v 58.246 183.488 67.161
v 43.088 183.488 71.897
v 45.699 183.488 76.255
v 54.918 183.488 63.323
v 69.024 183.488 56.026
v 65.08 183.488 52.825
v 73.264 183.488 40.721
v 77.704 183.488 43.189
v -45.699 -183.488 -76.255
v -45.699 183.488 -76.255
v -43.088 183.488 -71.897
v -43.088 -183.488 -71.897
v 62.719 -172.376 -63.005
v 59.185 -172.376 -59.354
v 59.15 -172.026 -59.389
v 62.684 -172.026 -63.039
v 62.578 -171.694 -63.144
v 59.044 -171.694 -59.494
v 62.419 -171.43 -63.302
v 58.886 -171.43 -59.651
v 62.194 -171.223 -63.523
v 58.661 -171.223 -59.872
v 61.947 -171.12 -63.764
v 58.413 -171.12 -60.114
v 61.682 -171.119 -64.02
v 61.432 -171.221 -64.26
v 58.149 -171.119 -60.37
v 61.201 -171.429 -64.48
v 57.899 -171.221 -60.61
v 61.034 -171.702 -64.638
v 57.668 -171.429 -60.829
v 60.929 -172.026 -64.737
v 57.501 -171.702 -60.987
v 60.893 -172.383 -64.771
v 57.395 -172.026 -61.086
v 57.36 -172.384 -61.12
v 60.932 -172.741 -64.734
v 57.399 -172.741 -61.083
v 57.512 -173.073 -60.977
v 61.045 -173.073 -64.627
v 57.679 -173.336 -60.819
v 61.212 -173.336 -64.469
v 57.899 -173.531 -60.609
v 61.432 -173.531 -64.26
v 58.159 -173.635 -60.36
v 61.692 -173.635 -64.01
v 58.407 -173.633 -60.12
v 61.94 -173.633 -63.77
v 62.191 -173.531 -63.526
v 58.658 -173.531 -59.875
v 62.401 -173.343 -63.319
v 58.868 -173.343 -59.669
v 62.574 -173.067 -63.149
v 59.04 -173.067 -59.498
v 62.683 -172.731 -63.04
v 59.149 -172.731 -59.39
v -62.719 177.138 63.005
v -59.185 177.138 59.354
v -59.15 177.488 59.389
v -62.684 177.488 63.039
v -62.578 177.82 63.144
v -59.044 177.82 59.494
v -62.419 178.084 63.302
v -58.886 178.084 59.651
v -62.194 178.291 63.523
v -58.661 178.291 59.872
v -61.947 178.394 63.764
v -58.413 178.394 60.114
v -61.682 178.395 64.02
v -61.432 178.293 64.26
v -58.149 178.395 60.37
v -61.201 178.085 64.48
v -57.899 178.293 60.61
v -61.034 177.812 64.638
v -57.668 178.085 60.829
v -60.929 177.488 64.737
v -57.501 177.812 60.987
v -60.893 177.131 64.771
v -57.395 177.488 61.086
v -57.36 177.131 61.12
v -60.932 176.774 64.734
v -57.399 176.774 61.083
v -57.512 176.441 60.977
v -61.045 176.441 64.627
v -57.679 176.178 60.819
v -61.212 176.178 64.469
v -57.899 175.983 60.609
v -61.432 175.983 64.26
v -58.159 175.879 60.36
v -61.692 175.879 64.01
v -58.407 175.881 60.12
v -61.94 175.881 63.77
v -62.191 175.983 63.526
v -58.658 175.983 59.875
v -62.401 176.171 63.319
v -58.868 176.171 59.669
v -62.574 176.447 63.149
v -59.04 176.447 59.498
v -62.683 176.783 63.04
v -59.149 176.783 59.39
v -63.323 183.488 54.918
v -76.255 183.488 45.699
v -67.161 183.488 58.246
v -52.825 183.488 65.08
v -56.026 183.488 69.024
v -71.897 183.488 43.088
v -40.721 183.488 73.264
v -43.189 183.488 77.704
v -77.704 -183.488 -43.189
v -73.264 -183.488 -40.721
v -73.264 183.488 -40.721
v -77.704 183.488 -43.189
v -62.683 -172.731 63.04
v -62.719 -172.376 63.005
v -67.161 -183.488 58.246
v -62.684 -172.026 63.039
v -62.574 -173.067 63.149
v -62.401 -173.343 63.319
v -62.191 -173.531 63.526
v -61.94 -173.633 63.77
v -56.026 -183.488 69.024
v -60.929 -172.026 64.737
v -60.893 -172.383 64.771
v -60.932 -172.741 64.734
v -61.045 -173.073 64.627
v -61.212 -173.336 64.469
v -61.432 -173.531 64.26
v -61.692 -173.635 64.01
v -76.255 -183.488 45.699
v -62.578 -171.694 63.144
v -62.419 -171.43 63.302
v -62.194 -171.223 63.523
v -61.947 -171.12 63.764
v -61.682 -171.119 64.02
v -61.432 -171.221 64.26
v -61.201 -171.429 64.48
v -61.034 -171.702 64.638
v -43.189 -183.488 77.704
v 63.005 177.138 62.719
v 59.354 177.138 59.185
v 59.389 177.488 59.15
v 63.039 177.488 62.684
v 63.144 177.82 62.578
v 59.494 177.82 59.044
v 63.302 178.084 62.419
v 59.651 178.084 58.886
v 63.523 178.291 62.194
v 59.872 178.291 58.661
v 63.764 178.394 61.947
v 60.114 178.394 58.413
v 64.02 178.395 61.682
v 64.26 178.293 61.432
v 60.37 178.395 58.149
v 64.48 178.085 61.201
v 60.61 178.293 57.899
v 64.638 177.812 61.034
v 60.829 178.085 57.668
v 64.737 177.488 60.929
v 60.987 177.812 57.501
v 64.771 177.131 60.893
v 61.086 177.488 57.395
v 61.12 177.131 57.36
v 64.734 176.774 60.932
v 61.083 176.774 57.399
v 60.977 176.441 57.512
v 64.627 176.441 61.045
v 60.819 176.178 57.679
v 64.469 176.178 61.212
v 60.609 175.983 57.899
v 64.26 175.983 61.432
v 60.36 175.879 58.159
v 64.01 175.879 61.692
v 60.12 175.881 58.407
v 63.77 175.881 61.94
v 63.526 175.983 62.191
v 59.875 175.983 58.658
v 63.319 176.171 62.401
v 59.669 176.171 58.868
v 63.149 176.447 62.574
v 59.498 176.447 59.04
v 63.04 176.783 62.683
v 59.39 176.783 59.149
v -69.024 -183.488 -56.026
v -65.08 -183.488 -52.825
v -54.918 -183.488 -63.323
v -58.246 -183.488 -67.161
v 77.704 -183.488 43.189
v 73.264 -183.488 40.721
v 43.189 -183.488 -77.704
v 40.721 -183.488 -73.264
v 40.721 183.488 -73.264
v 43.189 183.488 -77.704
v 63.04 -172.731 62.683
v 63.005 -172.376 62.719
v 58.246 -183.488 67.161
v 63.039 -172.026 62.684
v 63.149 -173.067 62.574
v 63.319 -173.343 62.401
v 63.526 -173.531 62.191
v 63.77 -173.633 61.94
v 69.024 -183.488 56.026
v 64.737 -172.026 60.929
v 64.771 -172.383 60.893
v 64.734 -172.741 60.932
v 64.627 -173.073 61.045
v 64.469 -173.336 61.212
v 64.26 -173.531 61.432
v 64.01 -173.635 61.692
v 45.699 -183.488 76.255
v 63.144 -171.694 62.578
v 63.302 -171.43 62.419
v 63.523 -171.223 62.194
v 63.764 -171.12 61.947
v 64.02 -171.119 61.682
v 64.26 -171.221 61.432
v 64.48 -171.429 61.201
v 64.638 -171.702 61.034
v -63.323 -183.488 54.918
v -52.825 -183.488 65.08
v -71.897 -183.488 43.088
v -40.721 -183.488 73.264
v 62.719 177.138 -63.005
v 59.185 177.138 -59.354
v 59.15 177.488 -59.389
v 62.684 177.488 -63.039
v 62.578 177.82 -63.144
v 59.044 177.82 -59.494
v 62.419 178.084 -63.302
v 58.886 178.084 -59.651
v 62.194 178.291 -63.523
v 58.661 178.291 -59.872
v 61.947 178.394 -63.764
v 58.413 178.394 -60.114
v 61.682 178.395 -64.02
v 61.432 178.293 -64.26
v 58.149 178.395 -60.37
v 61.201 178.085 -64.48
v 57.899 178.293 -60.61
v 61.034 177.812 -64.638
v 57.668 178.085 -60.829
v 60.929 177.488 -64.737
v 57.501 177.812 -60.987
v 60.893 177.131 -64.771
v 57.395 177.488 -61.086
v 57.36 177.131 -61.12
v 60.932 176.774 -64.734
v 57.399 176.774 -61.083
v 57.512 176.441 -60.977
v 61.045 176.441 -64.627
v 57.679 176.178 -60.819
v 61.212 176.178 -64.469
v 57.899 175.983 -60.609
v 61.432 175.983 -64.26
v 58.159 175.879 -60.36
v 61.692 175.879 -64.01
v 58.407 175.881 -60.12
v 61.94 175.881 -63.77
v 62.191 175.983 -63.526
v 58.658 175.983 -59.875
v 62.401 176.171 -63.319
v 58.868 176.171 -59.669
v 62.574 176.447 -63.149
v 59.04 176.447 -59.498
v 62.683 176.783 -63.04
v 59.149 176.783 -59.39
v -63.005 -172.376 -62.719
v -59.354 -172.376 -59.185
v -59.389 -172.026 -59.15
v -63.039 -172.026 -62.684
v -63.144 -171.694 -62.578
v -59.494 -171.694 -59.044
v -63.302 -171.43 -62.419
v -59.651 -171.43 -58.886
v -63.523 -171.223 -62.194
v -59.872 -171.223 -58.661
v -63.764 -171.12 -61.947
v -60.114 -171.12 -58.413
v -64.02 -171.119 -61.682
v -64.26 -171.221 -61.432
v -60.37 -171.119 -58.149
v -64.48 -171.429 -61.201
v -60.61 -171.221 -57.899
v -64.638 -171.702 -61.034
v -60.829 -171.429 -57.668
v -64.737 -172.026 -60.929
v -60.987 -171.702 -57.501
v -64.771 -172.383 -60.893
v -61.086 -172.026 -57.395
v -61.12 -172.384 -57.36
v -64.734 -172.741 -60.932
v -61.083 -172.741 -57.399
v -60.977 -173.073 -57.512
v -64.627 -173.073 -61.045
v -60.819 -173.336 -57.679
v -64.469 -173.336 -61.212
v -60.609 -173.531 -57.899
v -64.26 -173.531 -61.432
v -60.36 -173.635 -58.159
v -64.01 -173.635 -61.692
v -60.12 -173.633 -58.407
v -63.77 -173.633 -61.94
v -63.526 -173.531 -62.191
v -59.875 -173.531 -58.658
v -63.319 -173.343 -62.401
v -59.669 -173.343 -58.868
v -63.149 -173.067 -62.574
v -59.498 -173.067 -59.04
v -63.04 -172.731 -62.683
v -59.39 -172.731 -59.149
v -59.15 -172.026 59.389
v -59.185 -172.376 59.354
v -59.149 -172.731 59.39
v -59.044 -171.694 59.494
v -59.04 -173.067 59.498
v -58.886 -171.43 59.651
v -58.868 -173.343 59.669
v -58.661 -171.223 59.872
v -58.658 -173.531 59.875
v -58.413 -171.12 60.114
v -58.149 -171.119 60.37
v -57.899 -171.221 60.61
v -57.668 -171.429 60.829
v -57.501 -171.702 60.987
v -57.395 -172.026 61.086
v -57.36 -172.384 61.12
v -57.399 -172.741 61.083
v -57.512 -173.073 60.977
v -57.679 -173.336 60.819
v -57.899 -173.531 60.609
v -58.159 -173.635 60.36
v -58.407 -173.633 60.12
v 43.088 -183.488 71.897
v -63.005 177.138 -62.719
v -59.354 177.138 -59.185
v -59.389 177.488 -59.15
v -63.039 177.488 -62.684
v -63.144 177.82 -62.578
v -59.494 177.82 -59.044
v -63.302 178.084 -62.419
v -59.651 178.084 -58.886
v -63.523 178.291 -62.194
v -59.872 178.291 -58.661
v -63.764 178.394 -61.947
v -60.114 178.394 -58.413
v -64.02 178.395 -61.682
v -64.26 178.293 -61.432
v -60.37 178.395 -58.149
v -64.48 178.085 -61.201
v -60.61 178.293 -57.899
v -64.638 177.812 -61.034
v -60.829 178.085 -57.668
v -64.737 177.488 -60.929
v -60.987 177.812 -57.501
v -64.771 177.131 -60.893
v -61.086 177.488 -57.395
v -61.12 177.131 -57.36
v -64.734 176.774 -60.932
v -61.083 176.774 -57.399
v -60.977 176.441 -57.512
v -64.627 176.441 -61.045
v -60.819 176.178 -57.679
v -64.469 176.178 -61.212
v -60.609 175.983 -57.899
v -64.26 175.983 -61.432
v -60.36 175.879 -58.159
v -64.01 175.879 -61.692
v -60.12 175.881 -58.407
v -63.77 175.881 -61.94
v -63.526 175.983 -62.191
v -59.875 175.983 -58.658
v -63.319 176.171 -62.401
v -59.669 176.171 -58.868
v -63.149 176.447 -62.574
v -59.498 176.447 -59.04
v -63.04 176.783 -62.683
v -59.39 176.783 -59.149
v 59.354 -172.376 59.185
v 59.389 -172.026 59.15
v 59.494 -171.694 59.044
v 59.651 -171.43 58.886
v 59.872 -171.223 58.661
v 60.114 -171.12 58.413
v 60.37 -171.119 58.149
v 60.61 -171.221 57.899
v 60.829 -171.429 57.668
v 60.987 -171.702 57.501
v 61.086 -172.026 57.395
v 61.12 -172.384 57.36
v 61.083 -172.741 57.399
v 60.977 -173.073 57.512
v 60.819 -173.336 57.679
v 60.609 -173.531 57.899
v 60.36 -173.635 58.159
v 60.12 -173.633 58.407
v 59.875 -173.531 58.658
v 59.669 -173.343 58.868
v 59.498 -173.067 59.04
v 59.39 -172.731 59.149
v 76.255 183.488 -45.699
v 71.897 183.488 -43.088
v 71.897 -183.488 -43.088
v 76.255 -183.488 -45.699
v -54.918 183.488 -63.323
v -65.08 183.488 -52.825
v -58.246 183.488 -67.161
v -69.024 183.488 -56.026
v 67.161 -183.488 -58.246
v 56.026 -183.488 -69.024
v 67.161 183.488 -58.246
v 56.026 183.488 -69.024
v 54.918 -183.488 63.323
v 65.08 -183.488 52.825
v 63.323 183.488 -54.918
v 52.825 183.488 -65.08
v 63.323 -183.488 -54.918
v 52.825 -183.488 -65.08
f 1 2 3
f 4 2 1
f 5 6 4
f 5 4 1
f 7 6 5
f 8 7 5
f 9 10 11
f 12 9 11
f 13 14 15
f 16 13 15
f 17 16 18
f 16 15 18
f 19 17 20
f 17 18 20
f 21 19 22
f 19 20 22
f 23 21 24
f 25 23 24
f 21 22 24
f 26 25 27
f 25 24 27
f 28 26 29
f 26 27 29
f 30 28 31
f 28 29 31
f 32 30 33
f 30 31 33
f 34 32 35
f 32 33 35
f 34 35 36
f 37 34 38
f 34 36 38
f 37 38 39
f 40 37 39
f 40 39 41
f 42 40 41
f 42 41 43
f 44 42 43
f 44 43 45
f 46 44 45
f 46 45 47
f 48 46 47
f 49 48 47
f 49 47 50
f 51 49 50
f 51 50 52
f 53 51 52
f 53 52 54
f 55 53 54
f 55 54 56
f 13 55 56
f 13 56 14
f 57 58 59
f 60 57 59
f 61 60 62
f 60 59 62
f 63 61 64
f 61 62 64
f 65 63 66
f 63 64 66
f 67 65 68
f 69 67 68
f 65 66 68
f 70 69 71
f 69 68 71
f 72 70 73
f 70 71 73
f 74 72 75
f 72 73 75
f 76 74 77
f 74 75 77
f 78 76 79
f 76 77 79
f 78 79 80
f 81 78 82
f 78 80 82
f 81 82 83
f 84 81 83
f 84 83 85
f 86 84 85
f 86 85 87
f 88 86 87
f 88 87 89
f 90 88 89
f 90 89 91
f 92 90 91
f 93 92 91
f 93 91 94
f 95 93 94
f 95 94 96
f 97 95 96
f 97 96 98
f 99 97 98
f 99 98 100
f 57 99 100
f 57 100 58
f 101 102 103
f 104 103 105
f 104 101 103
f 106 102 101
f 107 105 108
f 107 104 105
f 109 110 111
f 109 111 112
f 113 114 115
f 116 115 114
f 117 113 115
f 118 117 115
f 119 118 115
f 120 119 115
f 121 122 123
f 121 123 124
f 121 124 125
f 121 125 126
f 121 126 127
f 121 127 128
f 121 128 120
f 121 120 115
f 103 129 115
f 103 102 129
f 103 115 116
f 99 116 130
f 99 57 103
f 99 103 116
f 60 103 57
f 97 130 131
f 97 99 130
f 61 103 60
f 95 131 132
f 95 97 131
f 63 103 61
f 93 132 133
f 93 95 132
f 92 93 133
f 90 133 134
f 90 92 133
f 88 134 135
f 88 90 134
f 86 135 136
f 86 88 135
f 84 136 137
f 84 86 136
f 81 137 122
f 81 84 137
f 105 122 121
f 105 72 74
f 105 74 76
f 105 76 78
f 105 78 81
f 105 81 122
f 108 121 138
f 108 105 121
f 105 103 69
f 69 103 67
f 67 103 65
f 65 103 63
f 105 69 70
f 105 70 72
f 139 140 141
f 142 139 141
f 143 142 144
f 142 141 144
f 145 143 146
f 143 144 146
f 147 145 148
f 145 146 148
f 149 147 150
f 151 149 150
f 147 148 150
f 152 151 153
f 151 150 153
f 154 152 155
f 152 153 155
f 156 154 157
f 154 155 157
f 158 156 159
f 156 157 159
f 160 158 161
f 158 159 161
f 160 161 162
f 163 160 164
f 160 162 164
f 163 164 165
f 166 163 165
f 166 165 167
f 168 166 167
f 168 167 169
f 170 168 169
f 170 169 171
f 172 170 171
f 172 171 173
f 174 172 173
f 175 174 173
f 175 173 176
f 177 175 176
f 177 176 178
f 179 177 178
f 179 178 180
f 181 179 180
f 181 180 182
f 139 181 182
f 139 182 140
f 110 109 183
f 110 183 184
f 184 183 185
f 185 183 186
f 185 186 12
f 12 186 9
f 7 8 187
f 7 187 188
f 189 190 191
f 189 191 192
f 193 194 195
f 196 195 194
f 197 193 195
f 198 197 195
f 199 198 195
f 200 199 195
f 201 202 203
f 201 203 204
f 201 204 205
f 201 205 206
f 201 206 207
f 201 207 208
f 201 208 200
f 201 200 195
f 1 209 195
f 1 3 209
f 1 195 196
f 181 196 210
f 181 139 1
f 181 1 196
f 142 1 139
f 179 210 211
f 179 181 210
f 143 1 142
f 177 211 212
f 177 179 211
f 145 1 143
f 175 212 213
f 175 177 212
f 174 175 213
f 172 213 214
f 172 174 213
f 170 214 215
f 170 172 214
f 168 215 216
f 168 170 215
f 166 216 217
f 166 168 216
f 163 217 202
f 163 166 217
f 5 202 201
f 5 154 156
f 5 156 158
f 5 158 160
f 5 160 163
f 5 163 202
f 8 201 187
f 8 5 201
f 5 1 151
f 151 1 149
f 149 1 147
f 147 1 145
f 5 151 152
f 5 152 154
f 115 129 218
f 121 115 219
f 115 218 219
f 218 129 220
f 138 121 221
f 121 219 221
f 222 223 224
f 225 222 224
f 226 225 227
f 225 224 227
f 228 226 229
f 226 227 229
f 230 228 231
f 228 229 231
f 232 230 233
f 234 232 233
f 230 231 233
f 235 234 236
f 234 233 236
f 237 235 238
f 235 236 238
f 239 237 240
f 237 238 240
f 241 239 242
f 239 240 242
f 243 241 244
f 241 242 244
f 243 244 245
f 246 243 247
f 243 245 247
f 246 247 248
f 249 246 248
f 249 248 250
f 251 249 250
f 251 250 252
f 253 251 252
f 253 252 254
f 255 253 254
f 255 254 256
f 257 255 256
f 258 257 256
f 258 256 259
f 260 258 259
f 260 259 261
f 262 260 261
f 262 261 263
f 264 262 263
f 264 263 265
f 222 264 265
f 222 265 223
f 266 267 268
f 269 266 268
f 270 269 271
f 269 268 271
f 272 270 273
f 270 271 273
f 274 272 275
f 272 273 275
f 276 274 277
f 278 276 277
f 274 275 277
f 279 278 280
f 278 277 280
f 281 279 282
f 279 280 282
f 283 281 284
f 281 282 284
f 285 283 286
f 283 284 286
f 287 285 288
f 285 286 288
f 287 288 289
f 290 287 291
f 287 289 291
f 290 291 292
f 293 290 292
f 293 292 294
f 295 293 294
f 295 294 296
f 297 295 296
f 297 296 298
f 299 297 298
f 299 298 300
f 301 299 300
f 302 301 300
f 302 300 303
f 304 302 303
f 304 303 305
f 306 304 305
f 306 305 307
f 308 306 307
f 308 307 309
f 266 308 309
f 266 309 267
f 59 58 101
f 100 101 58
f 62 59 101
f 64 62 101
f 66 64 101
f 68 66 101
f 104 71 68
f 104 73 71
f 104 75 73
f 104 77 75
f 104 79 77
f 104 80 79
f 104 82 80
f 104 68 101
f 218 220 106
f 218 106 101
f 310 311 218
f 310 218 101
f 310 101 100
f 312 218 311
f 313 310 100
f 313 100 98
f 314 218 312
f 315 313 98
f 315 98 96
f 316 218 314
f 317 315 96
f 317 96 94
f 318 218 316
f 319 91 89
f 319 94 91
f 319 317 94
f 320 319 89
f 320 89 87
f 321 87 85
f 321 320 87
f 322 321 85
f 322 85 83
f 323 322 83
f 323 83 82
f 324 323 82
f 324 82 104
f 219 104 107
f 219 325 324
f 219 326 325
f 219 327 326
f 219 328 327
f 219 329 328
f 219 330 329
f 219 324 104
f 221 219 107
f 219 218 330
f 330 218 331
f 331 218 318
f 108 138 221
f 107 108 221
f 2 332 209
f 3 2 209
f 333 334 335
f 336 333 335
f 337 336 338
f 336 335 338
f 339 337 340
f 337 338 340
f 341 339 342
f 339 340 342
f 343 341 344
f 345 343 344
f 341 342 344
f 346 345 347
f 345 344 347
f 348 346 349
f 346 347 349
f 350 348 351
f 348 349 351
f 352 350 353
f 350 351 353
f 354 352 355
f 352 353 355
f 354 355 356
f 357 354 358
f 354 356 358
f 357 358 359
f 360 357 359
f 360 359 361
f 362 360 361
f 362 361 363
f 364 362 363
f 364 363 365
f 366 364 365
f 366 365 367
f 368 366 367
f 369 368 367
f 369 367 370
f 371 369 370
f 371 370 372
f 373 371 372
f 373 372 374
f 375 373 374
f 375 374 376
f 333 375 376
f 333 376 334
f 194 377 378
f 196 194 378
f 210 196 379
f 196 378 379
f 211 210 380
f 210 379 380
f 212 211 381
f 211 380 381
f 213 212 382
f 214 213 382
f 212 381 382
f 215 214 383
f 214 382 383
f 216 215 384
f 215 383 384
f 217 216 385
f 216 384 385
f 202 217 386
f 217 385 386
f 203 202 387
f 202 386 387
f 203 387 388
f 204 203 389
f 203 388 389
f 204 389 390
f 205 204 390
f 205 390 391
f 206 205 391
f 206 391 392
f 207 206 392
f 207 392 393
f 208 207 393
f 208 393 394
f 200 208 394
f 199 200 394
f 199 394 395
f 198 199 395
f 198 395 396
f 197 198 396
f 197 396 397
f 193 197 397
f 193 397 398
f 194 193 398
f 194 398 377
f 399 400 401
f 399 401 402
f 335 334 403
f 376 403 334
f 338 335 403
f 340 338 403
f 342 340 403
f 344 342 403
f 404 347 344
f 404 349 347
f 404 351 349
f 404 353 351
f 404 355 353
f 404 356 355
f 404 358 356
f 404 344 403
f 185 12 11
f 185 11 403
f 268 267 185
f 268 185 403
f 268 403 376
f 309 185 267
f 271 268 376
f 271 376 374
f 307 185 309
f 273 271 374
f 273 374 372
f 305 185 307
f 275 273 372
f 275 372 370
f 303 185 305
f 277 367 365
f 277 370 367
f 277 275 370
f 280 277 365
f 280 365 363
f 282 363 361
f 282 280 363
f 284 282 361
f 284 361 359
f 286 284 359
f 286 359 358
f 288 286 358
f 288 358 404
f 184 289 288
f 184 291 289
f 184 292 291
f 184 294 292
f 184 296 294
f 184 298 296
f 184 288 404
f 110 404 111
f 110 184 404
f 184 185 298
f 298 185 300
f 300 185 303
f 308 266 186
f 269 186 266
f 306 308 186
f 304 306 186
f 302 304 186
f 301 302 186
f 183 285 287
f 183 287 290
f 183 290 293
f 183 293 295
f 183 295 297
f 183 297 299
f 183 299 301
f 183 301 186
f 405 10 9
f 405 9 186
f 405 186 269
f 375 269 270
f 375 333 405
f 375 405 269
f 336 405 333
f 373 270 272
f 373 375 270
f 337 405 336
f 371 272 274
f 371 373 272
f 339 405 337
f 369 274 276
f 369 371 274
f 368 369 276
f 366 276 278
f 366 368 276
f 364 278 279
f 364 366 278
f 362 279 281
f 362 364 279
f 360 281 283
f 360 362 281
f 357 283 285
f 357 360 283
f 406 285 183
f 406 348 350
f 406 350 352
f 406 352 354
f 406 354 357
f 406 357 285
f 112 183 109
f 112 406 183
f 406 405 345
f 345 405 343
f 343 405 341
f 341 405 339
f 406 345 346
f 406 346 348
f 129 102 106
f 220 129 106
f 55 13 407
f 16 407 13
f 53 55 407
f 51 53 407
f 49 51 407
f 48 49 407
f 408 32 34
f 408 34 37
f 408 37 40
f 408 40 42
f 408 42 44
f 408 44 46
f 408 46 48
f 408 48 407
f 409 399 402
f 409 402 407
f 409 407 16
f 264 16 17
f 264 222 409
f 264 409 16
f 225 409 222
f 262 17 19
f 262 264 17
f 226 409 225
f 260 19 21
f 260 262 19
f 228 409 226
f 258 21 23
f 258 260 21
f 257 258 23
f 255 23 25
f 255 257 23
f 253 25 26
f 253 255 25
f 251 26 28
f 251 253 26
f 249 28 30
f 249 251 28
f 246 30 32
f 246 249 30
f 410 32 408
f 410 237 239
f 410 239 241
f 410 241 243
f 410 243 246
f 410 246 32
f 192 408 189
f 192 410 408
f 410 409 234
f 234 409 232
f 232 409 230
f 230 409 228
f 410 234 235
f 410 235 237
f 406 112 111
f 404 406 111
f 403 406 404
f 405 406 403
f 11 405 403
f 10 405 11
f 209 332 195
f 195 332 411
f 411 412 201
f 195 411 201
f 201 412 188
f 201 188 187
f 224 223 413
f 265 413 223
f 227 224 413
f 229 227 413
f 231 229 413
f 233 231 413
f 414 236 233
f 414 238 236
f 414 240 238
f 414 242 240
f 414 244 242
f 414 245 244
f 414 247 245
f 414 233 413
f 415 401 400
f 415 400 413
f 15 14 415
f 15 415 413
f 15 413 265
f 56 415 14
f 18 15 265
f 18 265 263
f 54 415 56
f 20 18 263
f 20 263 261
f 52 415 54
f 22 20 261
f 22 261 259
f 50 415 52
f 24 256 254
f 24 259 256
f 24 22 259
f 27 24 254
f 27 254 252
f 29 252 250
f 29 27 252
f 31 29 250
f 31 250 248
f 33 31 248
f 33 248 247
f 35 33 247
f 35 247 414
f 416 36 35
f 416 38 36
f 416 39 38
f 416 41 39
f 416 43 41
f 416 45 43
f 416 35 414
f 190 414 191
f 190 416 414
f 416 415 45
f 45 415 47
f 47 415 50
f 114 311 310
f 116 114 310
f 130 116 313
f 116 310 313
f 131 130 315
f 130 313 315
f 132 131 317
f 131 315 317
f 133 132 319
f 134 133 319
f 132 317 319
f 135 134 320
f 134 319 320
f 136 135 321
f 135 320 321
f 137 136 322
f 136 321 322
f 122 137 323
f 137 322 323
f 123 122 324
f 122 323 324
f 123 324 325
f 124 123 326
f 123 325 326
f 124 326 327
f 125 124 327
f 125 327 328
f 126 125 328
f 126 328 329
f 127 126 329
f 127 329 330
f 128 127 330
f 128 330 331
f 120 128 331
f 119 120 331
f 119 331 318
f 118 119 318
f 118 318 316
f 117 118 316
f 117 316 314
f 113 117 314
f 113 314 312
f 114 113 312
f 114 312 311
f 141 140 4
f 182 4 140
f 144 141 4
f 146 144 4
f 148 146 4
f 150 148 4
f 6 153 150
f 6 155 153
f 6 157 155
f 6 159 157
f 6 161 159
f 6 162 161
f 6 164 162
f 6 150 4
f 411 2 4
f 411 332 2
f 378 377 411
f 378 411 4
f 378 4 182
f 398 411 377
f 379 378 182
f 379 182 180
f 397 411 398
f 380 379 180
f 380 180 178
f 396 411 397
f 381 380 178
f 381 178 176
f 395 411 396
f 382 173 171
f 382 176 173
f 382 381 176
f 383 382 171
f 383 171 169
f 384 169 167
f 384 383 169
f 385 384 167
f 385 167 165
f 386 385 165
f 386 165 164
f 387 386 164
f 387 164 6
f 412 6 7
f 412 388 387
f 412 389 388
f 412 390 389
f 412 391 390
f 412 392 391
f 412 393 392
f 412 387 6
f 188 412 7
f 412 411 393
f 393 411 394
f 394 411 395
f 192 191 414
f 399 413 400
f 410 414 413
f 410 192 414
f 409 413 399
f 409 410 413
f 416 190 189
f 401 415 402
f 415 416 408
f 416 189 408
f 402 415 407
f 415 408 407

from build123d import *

# Parameters (mm, degrees)
SKETCH2_R               = 88.9
SKETCH2_R_2             = 83.82
BOSS_EXTRUDE1_DEPTH     = 183.48833
CUT_EXTRUDE1_DEPTH      = 184.48833
CUT_EXTRUDE1_DEPTH_BACK = 184.48833
SKETCH5_R               = 1.27
BOLT_HOLES_DEPTH        = 29.911624556
BOLT_PATTERN_COUNT      = 4


with BuildPart() as part:
    # Sketch2 → Boss-Extrude1 (new body, symmetric)
    with BuildSketch(Plane(origin=(0, 0, 0), x_dir=(1, 0, 0), z_dir=(0, 1, 0))):
        Circle(SKETCH2_R)
        Circle(SKETCH2_R_2, mode=Mode.SUBTRACT)
    extrude(amount=BOSS_EXTRUDE1_DEPTH, both=True)

    # Sketch3 → Cut-Extrude1 (cut, two sides)
    with BuildSketch(Plane(origin=(0, 0, 0), x_dir=(1, 0, 0), z_dir=(0, 1, 0))) as cut_extrude1_sk:
        Polygon((169.661755759, -94.300371224), (0, 0), (169.661755759, 101.677593364), align=None)
        Polygon((0, 0), (53.900027233, 96.974944394), (-58.116685864, 96.974944394), align=None)
        Polygon((-123.741299607, 68.777140945), (-123.741299607, -74.157652604), (0, 0), align=None)
        Polygon((-65.840936026, -118.45858783), (0, 0), (70.991745134, -118.45858783), align=None)
    extrude(amount=CUT_EXTRUDE1_DEPTH, mode=Mode.SUBTRACT)
    extrude(cut_extrude1_sk.sketch, amount=-CUT_EXTRUDE1_DEPTH_BACK, mode=Mode.SUBTRACT)

    # Sketch5 → Bolt holes (cut, through all)
    with BuildSketch(Plane(origin=(-56.309218645, 0, 58.175814955), x_dir=(-0.718540152, 0, -0.695485478), z_dir=(0.695485478, 0, -0.718540152))):
        with Locations((-0.02278764, 177.13833)):
            Circle(SKETCH5_R)
        with Locations((-0.02278764, -172.37583)):
            Circle(SKETCH5_R)
    bolt_holes = extrude(amount=-BOLT_HOLES_DEPTH, mode=Mode.SUBTRACT)

    # Bolt pattern: Bolt holes ×4 about axis
    bolt_pattern_axis = Axis((0, 183.48833, 0), (0, 1, 0))
    for i in range(1, BOLT_PATTERN_COUNT):
        add(bolt_holes.rotate(bolt_pattern_axis, i * 360 / BOLT_PATTERN_COUNT), mode=Mode.SUBTRACT)


solid = part.part
